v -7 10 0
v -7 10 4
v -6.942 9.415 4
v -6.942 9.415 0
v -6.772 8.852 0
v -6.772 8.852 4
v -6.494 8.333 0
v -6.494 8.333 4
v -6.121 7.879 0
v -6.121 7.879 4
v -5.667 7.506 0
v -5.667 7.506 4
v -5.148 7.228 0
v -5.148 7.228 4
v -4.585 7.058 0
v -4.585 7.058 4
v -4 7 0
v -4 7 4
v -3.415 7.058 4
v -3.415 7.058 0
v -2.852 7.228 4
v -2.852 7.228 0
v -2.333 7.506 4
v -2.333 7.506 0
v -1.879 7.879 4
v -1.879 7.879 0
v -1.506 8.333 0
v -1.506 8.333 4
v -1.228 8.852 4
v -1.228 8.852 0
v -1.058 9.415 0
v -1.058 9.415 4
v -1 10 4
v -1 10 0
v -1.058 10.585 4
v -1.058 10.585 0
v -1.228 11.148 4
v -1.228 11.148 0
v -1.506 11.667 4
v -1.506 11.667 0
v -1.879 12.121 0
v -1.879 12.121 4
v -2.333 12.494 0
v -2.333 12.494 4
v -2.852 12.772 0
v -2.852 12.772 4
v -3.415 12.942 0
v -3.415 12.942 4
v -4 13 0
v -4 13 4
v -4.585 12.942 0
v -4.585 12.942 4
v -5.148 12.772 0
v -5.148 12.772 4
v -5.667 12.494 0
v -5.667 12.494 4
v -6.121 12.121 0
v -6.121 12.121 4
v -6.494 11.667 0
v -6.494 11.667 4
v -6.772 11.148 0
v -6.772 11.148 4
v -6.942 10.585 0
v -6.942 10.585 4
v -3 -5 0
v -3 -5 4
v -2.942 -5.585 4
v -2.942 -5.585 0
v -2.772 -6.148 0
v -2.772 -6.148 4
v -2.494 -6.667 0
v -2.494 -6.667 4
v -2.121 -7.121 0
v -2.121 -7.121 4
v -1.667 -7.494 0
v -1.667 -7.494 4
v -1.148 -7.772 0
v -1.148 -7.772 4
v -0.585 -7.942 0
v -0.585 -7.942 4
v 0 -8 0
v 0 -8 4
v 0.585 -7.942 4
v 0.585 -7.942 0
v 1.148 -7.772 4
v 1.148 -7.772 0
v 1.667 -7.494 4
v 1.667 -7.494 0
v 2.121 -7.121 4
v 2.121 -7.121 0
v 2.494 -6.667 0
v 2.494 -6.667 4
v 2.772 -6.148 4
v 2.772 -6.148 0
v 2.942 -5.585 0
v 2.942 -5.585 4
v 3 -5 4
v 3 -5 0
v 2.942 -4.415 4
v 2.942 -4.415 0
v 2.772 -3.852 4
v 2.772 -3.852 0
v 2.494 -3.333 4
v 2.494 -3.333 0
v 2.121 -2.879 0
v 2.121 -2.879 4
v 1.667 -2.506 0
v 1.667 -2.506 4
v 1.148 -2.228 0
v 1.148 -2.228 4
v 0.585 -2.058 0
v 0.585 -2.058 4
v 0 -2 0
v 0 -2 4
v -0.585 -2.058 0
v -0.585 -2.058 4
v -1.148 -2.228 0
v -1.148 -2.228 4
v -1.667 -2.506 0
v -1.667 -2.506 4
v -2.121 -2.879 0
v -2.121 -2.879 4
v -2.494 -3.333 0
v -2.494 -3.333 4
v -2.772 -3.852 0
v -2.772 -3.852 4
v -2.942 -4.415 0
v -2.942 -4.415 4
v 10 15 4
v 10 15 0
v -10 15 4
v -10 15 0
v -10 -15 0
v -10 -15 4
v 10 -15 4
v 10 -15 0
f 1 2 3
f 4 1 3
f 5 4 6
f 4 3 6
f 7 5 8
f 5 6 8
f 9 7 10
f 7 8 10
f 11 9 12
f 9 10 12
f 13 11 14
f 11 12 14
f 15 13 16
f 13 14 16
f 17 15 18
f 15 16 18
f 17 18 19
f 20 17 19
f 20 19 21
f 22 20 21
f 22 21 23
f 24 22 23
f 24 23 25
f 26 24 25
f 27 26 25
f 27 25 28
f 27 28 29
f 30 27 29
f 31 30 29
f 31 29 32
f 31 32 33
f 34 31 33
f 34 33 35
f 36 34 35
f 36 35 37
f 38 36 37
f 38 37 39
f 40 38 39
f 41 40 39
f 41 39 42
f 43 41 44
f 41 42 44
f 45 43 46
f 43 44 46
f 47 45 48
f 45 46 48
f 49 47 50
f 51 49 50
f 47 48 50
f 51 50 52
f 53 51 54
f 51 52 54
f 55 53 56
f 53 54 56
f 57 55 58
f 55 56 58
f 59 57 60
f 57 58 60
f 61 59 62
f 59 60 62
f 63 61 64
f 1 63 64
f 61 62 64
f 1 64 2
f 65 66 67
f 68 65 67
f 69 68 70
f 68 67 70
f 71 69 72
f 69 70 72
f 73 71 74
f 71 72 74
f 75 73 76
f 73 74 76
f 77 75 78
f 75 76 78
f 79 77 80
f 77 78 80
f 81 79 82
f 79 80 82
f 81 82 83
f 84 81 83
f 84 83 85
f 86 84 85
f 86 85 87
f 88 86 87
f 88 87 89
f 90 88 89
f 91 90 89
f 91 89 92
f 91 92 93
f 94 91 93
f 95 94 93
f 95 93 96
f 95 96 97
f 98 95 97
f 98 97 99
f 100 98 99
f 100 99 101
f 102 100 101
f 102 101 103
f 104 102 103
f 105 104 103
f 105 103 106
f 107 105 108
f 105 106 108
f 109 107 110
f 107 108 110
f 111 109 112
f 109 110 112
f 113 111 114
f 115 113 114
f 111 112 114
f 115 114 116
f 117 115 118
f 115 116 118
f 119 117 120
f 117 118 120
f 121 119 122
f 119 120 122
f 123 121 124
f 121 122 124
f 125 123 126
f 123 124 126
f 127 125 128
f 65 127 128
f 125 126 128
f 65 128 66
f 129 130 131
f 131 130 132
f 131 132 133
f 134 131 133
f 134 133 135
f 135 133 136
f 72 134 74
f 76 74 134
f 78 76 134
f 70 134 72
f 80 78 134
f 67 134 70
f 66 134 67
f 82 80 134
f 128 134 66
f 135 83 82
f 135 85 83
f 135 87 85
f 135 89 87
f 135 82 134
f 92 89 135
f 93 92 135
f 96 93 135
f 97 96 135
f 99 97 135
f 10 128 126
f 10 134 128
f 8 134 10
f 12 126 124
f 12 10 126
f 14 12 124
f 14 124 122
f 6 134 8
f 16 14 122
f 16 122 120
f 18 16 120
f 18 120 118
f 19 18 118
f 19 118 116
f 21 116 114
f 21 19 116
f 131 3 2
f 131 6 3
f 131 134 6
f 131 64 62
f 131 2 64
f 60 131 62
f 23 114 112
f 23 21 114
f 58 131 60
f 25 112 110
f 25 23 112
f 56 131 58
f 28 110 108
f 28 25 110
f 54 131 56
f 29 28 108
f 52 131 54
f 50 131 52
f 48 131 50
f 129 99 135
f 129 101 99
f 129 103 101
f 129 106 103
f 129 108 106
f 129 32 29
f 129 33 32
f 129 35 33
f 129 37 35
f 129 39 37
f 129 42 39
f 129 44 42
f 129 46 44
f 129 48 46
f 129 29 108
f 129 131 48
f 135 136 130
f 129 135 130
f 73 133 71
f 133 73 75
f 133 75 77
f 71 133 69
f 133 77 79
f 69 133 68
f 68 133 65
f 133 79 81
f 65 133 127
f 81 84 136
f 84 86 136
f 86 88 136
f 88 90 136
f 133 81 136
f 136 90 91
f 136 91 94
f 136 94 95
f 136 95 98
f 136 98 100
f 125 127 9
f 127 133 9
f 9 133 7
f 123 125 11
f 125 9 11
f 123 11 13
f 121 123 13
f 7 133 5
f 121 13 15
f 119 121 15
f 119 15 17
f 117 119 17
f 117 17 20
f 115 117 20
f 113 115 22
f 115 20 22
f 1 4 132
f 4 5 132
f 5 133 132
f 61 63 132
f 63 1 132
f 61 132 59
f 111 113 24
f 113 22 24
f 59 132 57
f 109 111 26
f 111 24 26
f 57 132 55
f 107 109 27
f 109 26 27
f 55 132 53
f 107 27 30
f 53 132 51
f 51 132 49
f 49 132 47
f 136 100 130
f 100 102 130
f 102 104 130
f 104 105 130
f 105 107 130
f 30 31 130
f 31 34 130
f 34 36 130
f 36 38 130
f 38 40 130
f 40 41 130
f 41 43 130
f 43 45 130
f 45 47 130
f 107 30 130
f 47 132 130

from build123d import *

# Parameters (mm, degrees)
F1_DEPTH = 4
F2_D     = 6
F3_D     = 6


with BuildPart() as f1:
    # F0 (on Top) → F1 (new body)
    with BuildSketch(Plane.XY):
        Polygon((10, 15), (-10, 15), (-10, -15), (0, -15), (10, -15), align=None)
    extrude(amount=F1_DEPTH)

    # F2 (through all)
    with Locations(Plane(origin=(0, 0, 0), x_dir=(1, 0, 0), z_dir=(0, 0, -1))):
        with Locations((-4, -10)):
            Hole(F2_D / 2)

    # F3 (through all)
    with Locations(Plane(origin=(0, 0, 0), x_dir=(1, 0, 0), z_dir=(0, 0, -1))):
        with Locations((0, 5)):
            Hole(F3_D / 2)


solid = f1.part
